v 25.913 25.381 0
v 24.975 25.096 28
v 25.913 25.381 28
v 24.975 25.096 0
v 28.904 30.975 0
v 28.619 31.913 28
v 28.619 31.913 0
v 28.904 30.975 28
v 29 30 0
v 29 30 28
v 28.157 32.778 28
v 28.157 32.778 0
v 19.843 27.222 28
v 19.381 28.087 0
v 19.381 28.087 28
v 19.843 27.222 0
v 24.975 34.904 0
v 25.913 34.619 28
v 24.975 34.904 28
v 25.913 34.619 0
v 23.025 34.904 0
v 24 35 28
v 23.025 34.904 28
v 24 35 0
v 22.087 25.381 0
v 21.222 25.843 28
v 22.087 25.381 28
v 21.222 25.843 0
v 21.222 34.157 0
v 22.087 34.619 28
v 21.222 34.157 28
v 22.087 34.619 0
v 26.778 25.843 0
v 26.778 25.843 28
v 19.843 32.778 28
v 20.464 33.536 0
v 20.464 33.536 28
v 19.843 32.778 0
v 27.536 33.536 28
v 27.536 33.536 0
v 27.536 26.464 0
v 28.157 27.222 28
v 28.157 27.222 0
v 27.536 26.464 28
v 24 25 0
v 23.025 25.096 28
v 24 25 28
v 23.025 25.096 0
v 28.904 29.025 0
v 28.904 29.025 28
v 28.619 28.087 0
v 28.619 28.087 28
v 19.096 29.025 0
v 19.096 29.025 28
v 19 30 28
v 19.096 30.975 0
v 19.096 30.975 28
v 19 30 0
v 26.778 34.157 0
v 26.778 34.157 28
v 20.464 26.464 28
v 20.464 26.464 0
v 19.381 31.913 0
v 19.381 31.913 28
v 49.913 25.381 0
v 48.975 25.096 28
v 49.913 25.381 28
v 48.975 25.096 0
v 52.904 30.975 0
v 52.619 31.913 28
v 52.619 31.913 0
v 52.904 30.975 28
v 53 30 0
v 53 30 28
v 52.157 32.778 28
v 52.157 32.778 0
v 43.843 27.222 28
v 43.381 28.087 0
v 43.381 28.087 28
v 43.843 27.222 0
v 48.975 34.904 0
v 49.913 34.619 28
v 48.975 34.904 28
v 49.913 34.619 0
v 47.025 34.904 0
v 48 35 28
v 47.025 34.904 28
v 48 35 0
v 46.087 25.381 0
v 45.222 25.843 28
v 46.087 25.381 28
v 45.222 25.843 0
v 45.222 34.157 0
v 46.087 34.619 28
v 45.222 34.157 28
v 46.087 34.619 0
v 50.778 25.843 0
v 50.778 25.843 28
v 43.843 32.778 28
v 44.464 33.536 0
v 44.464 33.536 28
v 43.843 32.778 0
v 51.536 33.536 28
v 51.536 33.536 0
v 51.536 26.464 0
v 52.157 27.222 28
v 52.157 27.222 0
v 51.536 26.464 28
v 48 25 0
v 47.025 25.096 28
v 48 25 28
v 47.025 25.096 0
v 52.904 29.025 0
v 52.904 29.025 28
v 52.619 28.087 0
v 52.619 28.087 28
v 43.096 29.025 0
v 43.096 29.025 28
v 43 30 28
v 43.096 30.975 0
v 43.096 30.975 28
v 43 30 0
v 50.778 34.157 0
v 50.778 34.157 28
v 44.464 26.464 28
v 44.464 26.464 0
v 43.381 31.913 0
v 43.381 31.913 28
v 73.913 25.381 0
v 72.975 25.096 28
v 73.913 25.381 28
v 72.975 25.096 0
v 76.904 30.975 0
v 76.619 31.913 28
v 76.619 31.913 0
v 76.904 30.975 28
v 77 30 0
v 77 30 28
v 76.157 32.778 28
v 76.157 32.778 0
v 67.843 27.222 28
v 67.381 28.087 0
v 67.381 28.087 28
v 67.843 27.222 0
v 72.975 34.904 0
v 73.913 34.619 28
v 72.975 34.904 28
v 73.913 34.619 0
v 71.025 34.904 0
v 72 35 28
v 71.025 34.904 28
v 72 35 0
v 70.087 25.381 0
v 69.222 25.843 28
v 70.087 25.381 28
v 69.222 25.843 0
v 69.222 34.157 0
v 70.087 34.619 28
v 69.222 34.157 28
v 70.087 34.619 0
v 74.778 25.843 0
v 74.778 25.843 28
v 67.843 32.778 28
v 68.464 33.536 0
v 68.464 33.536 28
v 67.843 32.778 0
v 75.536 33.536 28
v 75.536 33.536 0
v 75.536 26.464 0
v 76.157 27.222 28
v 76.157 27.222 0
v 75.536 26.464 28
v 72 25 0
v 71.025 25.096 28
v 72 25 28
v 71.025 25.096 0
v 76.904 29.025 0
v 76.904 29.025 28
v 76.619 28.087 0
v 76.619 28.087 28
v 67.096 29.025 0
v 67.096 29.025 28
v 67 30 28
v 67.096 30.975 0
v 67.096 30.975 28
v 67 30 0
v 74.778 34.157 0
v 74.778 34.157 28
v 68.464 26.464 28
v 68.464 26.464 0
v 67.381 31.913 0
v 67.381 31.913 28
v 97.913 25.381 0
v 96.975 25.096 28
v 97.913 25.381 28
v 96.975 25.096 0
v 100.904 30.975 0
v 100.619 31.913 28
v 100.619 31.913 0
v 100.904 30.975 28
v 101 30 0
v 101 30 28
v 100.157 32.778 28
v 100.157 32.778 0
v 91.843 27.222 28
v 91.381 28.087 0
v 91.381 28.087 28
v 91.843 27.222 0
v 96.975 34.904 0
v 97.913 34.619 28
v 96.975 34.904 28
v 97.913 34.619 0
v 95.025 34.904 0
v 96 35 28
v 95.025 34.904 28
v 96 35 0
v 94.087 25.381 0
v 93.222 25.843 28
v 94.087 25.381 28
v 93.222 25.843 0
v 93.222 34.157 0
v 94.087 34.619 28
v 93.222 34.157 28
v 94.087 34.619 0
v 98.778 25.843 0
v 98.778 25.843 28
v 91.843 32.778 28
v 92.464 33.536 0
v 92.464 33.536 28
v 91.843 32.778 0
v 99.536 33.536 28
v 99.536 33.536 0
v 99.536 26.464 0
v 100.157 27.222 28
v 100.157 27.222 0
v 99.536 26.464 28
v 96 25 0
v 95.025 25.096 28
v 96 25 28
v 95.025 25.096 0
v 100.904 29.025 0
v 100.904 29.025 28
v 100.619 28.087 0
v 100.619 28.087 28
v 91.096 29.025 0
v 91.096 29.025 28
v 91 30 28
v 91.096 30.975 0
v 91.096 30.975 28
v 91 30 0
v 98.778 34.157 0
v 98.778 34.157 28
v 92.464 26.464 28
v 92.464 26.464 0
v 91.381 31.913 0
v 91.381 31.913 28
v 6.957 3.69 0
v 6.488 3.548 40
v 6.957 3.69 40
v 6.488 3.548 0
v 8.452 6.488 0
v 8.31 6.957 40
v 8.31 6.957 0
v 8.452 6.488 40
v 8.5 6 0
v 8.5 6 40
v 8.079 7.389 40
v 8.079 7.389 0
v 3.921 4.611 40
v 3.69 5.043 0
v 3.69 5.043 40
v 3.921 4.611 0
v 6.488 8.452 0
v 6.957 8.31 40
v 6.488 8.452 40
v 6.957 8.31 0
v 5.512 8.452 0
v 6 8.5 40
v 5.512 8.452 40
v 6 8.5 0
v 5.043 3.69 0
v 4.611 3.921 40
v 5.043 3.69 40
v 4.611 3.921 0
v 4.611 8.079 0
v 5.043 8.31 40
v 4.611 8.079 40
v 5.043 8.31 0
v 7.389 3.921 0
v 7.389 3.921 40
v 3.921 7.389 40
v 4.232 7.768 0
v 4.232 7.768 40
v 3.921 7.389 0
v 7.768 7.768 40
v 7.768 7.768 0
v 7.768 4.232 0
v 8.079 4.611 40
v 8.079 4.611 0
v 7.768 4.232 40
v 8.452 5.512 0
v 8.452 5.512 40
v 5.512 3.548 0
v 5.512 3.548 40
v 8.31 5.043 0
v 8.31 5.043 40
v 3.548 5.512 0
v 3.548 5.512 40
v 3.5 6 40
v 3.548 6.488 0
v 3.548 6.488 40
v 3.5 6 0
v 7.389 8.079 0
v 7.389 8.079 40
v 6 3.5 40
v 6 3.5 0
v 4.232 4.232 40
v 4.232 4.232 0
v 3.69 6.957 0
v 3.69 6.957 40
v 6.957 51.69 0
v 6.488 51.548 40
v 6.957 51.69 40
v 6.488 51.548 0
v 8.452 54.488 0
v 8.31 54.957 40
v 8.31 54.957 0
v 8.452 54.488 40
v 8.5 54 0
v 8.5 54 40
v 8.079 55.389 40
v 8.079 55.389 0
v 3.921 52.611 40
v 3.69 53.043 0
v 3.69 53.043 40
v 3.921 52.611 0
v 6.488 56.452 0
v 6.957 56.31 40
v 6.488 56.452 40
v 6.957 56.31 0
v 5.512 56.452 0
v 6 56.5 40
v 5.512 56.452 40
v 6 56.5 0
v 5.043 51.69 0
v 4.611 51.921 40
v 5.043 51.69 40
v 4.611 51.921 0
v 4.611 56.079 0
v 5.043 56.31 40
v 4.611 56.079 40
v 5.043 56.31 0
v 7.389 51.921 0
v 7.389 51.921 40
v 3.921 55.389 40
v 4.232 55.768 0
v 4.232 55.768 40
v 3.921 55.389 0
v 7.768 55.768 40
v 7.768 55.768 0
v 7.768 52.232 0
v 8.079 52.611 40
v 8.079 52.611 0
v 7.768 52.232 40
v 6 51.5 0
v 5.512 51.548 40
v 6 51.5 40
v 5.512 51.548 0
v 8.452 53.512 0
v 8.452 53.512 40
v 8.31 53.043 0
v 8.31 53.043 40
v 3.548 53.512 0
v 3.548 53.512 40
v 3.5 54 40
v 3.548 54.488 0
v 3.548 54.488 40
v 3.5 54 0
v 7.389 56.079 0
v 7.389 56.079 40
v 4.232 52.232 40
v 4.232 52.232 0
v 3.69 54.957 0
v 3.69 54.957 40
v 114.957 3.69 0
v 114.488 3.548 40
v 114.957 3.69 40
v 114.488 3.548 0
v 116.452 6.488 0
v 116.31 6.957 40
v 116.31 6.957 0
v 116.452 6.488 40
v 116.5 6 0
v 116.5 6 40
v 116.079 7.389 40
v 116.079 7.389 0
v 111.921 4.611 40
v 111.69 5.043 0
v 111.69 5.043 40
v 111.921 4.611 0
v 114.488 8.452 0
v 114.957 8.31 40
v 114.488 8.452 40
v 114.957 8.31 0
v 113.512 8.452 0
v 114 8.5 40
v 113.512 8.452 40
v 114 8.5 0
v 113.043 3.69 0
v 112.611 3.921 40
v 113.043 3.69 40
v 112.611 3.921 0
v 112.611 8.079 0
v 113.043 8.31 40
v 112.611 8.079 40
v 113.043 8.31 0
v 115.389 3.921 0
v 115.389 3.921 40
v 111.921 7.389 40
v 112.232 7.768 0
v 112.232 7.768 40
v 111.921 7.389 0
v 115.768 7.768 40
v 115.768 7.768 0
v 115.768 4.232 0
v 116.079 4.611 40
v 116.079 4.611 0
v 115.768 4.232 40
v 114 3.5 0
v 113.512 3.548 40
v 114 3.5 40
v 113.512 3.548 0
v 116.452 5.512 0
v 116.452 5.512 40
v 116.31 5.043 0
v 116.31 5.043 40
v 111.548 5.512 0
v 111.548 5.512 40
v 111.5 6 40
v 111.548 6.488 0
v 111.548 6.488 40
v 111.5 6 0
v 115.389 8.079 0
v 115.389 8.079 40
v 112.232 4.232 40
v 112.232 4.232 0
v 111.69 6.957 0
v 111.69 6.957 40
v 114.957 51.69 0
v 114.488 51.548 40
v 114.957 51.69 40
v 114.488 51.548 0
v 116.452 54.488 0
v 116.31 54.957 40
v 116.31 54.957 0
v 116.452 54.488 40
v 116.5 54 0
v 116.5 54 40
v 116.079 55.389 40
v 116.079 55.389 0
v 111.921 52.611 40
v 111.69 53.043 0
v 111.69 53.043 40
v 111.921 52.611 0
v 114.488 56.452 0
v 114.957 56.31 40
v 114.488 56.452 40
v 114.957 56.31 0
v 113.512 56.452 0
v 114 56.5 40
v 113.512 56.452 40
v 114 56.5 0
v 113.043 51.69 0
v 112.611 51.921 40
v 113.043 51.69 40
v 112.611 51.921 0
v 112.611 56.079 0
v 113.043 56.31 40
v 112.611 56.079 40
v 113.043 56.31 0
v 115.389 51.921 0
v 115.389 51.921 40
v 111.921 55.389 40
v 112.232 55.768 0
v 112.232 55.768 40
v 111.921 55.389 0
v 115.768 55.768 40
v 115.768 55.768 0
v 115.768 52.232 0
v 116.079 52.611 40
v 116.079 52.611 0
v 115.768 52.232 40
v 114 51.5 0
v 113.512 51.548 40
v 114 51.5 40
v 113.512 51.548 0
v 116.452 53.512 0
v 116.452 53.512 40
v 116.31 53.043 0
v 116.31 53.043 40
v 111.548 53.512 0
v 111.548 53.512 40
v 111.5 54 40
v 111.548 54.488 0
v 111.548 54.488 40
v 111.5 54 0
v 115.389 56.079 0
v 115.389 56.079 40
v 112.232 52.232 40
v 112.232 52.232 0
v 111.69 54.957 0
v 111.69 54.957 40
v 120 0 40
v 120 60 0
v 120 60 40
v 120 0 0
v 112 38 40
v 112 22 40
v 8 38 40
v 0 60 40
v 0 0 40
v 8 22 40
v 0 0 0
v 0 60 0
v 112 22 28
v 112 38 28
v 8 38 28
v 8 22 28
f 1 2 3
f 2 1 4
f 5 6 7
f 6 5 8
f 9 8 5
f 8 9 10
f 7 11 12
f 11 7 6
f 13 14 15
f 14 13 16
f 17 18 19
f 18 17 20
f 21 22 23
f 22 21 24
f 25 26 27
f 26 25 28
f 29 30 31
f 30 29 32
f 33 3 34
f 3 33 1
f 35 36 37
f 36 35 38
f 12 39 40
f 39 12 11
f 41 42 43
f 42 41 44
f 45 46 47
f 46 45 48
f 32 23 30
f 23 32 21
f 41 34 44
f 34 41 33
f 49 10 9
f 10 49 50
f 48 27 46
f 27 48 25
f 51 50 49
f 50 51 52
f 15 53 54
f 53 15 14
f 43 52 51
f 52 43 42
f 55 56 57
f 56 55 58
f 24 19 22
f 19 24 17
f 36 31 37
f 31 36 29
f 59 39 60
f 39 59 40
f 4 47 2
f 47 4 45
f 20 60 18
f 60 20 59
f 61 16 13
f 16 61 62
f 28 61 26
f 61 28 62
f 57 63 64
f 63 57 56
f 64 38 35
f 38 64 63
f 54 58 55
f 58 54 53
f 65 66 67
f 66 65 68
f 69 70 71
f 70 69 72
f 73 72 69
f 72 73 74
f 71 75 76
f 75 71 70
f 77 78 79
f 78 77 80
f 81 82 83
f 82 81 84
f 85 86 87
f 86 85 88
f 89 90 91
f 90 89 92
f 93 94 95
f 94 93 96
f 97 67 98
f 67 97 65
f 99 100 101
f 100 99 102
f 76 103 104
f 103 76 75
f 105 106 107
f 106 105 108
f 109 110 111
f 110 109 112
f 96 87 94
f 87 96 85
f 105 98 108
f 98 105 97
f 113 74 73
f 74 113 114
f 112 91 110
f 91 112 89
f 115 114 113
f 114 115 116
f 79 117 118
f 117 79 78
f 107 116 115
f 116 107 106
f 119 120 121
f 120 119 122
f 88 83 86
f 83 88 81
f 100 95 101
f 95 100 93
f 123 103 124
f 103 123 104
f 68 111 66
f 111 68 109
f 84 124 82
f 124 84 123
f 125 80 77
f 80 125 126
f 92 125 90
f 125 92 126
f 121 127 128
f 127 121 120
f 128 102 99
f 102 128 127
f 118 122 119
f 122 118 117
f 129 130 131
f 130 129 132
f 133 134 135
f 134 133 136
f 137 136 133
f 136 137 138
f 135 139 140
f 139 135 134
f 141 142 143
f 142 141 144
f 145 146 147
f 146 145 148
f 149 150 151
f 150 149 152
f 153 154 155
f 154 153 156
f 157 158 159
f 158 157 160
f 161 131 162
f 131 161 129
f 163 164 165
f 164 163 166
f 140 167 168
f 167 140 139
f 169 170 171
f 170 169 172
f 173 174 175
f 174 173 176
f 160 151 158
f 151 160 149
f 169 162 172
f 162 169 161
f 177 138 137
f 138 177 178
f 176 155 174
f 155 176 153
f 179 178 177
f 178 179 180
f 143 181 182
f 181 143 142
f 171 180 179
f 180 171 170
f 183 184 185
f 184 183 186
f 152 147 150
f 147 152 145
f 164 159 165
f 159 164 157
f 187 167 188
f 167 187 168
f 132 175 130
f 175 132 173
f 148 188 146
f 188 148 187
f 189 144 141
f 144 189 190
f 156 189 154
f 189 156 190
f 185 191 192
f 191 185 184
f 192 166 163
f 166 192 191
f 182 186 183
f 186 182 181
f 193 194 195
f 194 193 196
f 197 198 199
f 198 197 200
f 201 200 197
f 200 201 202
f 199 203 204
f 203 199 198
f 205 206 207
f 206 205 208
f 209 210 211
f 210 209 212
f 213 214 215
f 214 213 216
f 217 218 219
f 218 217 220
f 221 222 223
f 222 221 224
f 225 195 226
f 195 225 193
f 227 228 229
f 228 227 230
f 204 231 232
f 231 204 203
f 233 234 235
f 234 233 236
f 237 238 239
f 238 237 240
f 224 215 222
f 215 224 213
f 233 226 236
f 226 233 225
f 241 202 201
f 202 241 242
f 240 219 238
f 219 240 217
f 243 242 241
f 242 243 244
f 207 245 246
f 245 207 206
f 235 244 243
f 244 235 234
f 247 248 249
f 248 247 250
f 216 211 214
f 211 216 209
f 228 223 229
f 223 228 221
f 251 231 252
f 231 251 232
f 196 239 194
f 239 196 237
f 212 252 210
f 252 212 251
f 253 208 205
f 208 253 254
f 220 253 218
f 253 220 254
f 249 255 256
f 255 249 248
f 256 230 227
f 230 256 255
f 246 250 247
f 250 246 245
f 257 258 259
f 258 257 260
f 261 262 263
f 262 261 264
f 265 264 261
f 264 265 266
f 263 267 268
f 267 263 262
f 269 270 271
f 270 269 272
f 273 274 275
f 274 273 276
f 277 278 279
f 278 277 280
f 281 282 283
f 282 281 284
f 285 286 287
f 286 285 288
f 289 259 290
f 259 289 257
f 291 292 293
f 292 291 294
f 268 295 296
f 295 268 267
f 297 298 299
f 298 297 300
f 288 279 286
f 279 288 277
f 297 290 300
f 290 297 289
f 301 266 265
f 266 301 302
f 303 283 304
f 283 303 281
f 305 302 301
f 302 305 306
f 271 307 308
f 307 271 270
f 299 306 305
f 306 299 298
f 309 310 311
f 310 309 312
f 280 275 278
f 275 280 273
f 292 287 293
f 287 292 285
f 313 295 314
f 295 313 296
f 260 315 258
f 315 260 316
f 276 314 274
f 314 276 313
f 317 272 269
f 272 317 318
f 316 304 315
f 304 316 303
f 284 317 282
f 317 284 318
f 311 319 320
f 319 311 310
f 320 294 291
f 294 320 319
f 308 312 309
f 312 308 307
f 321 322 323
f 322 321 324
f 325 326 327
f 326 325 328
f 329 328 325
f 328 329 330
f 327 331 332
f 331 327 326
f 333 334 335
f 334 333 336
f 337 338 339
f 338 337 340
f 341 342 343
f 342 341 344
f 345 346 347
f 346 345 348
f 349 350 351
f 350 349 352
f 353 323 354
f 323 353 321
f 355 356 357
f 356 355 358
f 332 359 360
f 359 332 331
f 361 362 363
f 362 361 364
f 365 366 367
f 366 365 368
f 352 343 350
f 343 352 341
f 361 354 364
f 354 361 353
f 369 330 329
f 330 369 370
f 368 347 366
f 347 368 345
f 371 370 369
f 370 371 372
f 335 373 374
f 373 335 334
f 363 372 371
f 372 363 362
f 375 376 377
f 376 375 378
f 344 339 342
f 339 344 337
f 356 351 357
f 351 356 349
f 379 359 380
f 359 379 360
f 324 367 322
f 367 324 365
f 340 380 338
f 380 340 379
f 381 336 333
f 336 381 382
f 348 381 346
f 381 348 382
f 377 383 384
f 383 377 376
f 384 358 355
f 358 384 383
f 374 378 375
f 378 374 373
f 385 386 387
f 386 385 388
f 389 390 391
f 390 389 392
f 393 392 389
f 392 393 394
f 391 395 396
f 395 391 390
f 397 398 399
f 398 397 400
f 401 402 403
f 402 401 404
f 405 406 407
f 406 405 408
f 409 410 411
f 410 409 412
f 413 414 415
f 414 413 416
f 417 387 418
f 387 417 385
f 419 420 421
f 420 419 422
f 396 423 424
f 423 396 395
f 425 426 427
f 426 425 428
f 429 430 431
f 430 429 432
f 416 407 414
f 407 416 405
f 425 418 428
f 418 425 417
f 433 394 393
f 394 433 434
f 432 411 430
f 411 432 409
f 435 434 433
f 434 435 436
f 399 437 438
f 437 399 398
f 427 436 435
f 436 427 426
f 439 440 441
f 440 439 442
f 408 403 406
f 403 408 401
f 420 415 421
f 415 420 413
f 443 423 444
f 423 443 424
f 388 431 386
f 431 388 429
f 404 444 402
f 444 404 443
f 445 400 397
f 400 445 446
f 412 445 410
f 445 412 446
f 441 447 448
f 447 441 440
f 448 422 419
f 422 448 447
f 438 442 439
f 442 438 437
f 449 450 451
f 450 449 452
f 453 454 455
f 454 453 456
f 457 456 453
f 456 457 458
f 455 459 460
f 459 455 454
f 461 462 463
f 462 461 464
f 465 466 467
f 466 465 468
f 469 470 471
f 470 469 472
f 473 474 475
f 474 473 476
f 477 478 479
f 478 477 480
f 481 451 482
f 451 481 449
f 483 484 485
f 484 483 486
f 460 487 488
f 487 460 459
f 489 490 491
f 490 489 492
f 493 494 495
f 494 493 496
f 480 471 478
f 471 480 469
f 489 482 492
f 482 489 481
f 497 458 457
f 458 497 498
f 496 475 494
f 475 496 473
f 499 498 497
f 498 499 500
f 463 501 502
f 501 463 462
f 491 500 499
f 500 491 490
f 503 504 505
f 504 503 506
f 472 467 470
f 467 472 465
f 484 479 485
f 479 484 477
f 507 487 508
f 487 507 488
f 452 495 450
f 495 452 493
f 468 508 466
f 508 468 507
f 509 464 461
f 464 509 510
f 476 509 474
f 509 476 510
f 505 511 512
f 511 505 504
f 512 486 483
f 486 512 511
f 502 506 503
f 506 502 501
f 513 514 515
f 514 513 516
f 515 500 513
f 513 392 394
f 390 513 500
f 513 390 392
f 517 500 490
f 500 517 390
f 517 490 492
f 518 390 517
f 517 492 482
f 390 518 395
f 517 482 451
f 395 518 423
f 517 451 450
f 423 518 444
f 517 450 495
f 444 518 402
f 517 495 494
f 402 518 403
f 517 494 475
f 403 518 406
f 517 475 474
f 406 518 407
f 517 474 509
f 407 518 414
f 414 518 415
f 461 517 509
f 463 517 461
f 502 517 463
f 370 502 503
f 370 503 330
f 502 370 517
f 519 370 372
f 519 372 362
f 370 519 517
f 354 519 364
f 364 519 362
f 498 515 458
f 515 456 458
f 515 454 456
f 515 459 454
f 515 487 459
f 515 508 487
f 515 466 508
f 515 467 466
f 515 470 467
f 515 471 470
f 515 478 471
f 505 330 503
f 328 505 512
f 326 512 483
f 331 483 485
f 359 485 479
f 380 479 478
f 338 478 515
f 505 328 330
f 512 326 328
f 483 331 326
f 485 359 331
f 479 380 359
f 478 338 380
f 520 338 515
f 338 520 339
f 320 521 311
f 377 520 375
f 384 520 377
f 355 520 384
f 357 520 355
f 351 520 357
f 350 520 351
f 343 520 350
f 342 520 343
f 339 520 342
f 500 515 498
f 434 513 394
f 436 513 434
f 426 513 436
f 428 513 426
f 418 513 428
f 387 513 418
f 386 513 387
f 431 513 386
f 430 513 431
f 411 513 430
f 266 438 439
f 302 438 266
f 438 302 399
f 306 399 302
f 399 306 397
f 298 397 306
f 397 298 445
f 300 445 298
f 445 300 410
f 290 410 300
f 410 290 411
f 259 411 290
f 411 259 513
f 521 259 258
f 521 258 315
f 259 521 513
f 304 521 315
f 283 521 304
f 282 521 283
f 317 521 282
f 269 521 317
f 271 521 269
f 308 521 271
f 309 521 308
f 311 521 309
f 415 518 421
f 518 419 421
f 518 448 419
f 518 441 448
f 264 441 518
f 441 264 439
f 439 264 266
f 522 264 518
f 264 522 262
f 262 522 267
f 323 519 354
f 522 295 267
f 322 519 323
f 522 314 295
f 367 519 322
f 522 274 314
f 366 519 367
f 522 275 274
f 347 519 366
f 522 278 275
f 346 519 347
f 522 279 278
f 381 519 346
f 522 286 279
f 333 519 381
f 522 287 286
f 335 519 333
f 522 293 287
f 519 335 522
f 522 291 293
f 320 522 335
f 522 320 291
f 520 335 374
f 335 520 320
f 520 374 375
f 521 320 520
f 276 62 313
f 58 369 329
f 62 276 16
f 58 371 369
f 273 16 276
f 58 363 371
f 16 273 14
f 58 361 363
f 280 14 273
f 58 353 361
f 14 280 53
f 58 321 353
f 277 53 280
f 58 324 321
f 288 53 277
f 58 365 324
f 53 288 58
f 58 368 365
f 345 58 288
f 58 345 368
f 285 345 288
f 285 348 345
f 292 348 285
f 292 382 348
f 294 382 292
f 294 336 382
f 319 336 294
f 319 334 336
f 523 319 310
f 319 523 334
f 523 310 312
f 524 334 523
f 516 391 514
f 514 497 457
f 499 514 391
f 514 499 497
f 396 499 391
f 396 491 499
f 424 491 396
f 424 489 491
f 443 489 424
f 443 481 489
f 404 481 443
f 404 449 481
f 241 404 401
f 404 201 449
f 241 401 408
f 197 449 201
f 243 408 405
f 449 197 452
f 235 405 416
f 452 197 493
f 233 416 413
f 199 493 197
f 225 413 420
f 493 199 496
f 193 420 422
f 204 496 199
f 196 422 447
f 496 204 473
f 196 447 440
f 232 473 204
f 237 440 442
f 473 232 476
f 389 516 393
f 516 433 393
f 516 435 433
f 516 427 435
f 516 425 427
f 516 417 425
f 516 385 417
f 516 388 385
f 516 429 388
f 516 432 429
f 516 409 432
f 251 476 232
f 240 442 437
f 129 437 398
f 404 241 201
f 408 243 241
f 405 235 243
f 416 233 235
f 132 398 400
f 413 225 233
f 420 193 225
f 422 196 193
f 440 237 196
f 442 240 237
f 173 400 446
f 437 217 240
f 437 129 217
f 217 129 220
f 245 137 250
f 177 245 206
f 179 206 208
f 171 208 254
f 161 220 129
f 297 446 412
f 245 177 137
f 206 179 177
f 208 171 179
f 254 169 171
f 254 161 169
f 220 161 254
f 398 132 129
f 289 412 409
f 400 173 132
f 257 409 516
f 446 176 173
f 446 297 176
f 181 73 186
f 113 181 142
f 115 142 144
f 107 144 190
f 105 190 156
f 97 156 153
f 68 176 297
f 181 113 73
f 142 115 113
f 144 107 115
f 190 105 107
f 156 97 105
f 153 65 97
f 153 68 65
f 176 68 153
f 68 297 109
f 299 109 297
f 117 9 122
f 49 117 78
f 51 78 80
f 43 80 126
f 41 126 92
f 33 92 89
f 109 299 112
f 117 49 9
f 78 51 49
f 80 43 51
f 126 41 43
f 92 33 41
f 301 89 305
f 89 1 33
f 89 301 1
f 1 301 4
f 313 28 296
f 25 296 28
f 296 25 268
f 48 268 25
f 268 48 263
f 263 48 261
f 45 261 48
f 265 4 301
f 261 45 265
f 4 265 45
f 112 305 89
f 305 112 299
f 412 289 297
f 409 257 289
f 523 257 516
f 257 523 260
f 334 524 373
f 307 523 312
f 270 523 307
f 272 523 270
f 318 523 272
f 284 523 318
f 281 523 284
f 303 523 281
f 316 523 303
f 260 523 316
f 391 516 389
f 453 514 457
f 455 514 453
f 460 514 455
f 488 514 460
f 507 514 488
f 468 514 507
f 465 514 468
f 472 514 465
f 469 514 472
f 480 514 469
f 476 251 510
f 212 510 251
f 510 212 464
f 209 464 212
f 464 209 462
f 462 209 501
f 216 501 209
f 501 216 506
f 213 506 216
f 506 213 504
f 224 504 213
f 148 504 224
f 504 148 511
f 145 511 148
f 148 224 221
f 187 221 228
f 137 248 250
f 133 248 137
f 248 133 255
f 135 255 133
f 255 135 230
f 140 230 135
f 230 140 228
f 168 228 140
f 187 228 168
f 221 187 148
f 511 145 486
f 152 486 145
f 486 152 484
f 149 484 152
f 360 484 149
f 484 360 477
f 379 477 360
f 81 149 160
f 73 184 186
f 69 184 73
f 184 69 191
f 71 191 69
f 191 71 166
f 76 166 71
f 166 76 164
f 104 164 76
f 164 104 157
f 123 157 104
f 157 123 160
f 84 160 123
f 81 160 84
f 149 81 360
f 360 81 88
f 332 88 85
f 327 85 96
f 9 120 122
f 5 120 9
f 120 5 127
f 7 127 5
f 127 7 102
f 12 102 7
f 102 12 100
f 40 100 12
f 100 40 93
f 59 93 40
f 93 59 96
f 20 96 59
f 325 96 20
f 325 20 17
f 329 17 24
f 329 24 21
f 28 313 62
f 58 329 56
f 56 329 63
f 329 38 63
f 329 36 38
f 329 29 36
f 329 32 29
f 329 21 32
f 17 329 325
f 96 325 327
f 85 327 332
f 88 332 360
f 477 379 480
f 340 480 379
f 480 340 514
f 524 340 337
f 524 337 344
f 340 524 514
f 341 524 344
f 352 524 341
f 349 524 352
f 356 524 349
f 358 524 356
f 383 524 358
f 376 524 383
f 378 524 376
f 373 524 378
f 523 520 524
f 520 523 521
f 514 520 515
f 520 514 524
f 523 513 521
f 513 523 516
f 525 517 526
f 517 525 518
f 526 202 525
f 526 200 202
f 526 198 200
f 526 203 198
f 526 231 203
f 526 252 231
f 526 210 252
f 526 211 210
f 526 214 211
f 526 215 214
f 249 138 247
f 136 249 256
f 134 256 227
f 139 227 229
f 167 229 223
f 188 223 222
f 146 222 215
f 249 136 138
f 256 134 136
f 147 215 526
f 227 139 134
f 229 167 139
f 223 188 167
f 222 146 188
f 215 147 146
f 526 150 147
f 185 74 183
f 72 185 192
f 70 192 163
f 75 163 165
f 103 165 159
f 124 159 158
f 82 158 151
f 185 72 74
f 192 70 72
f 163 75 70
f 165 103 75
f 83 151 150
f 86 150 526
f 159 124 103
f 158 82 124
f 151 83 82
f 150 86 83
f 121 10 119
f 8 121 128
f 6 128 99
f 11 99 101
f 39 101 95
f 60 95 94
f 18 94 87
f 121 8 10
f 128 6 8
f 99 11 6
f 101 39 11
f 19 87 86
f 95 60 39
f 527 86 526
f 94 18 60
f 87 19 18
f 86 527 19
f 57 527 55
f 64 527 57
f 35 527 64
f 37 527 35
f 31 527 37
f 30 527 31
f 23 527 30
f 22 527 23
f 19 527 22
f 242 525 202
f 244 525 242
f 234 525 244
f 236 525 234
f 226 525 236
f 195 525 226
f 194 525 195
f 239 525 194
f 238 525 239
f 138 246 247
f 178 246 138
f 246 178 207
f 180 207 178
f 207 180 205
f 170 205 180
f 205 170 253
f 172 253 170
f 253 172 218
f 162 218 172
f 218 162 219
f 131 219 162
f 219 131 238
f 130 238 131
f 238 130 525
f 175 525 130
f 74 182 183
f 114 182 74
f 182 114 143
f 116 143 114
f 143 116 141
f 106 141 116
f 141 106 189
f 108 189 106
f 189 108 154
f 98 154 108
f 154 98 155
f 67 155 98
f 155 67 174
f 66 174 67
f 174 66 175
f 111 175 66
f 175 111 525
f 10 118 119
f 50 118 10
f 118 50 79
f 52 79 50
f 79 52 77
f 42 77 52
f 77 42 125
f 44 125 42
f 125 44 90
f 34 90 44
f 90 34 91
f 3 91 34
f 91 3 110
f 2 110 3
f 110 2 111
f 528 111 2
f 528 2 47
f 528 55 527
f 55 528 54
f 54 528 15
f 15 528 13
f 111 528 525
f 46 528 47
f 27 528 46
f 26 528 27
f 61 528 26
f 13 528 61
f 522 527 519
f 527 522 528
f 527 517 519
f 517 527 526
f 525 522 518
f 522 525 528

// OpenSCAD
$fn = 32;

// ----------------------------------------------------------------------
// Manifold block: gallery_top manifold
// ----------------------------------------------------------------------

// --- parameters (mm) ---
block_l = 120;            // block length, X
block_w = 60;             // block width, Y
block_h = 40;             // block height, Z
port_d = 10;              // port bore diameter
port_pitch = 24;          // port pitch along X
gallery_d = 16;           // top gallery width, Y
gallery_depth = 12;       // gallery pocket depth
wall_p = 8;               // gallery end wall thickness, X
mnt_d = 5;                // mounting hole diameter
mnt_in = 6;               // mounting hole inset from the edges

n_ports = 4;  // ports in the row
port_x0 = (block_l - (n_ports - 1) * port_pitch) / 2;  // first port X

difference() {
  cube([block_l, block_w, block_h]);
  for (i = [0 : n_ports - 1])
    translate([port_x0 + i * port_pitch, block_w / 2, -1])
      cylinder(h = block_h + 2, d = port_d);
  translate([wall_p, block_w / 2 - gallery_d / 2, block_h - gallery_depth])
    cube([block_l - 2 * wall_p, gallery_d, gallery_depth + 1]);
  for (cx = [mnt_in, block_l - mnt_in])
    for (cy = [mnt_in, block_w - mnt_in])
      translate([cx, cy, -1]) cylinder(h = block_h + 2, d = mnt_d);
}
